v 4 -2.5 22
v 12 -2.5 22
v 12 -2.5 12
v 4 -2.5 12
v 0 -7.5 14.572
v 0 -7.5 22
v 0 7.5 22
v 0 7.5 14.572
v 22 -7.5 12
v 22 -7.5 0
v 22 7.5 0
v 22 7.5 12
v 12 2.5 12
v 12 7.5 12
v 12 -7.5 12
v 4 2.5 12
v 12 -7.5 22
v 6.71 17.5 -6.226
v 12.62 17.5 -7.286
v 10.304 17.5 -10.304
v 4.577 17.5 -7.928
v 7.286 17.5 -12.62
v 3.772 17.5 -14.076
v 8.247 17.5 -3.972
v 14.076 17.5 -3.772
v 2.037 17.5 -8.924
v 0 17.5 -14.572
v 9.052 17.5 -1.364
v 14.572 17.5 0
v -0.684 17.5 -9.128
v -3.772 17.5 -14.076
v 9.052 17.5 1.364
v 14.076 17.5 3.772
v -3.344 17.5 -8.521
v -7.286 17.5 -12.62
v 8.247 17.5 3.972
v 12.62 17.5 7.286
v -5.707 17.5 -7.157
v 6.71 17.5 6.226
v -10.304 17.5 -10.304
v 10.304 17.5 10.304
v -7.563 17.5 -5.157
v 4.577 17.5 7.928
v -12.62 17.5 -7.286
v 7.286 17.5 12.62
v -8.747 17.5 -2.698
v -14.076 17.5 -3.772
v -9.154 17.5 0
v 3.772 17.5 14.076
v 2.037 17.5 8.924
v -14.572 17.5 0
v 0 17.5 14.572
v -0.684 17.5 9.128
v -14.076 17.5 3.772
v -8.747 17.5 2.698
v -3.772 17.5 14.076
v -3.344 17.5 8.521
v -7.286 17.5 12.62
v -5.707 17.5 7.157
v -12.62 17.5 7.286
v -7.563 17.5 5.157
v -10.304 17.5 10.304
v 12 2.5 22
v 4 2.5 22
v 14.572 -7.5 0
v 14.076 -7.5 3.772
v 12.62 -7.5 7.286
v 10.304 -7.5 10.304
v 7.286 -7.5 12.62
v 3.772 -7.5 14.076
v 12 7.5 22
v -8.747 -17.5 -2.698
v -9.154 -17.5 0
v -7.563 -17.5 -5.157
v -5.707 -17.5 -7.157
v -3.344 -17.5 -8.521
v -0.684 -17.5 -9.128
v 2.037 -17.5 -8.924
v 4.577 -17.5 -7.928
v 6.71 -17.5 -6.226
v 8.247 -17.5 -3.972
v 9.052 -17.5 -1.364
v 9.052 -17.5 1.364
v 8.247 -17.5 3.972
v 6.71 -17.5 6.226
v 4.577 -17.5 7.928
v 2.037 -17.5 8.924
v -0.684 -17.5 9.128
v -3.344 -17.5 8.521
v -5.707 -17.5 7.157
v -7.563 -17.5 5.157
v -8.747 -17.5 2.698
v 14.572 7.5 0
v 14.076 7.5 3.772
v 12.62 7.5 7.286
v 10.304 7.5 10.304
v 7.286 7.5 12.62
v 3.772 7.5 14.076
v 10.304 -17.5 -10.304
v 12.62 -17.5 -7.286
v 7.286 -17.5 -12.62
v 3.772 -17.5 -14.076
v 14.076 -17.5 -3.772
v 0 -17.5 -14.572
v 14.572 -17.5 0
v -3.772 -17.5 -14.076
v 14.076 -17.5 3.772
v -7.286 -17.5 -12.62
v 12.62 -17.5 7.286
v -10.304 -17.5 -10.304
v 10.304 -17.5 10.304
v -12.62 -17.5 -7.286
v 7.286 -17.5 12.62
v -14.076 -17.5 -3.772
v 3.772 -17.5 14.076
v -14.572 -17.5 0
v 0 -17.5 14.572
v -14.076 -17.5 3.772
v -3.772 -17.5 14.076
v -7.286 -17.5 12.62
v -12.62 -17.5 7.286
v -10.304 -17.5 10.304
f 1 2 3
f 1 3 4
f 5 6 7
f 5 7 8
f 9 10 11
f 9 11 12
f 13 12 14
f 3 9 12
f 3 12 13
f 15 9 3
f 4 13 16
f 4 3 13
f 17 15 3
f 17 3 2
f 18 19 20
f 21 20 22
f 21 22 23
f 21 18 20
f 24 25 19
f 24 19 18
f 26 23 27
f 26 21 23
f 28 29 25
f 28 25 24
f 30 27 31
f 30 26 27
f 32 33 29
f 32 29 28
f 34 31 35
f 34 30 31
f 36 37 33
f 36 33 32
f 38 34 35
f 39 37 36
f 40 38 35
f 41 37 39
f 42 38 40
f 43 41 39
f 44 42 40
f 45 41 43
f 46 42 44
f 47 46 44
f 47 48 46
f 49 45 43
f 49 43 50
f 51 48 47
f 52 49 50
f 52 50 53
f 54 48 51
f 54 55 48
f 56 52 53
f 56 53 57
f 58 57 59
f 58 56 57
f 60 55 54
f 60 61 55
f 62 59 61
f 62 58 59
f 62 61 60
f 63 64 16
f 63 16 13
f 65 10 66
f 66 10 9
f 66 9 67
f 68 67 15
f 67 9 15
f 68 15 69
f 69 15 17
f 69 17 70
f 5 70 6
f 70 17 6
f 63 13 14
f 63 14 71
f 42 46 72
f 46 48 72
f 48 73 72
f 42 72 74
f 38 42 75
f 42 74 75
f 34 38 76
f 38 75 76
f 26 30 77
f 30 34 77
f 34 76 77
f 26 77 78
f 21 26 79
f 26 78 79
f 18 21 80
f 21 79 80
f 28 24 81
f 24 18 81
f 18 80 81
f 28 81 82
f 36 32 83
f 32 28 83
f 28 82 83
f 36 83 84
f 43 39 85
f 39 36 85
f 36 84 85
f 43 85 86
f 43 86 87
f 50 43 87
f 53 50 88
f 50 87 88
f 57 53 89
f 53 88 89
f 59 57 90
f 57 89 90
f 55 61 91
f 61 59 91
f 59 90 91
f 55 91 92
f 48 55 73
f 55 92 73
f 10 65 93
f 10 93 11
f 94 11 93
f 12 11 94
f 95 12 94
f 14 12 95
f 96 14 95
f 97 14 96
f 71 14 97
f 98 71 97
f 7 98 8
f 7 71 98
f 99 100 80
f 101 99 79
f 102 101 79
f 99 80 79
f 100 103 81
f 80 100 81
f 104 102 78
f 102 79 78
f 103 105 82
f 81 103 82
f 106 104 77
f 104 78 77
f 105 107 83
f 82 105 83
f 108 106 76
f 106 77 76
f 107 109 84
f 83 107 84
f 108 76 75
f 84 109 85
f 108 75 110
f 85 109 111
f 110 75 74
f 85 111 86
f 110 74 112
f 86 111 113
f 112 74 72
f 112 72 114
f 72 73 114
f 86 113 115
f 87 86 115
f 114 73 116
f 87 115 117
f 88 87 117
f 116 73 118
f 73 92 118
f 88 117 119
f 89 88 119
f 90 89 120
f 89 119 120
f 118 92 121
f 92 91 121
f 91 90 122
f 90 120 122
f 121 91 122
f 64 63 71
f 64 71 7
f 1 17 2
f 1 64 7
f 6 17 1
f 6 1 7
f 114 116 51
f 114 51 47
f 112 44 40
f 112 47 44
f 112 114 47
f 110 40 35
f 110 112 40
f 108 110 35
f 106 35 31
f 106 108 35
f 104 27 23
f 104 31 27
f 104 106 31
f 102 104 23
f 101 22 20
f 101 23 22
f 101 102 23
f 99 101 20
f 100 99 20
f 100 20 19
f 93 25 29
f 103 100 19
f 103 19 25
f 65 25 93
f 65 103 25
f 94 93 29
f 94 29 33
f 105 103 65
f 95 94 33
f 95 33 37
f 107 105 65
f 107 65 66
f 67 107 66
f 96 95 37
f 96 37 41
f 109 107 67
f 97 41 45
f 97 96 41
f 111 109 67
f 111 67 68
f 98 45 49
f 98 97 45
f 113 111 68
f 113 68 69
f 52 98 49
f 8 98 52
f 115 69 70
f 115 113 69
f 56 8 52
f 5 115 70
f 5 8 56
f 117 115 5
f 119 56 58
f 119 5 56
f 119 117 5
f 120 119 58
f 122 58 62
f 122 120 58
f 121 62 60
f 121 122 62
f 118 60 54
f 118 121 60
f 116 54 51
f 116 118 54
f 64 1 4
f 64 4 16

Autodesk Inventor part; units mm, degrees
ref_plane "YZ Plane" through (0, 0, 0) normal (1, 0, 0) x (0, 1, 0)
ref_plane "XZ Plane" through (0, 0, 0) normal (0, 1, 0) x (-1, 0, 0)
ref_plane "XY Plane" through (0, 0, 0) normal (0, 0, 1) x (1, 0, 0)
sketch "Boceto1" plane through (0, 0, 0) normal (0, 1, 0) x (-1, 0, 0)
  circle A0 centre (0, 0) radius 9.154
  circle A1 centre (0, 0) radius 14.5725
extrude "Extrusión1" add sketch "Boceto1" along normal mid plane 35
sketch "Boceto2" plane through (0, 0, 0) normal (0, 1, 0) x (-1, 0, 0)
  line L0 (-12, 0) -> (-22, 0)
  line L1 (-22, 0) -> (-22, 12)
  line L2 (-22, 12) -> (-12, 12)
  line L3 (-12, 12) -> (-12, 22)
  line L4 (-12, 22) -> (0, 22)
  line L5 (0, 22) -> (0, 12)
  arc A0 (0, 12) -> (-12, 0) centre (0, 0) ccw
  line L6 (0, 0) -> (0, 23.3606) construction
  line L7 (0, 0) -> (-38.6088, 0) construction
  point P0 (0, 17)
  dimension "d4" = 10
  dimension "d5" = 12
  dimension "d6" = 10
  dimension "d7" = 12
  dimension "d10" = 10
  dimension "d11" = 10
extrude "Extrusión2" add sketch "Boceto2" along normal mid plane 15
sketch "Boceto3" plane through (0, 7.5, 22) normal (0, 0, 1) x (1, 0, 0)
  line L0 (4, -5) -> (12, -5)
  line L1 (12, -5) -> (12, -10)
  line L2 (12, -10) -> (4, -10)
  line L3 (4, -10) -> (4, -5)
  line L4 (12, -15) -> (12, 0) projected
  line L5 (12, -15) -> (0, -15) projected
  point P0 (0, -7.5)
  dimension "d8" = 5
  dimension "d9" = 5
  dimension "d14" = 8
extrude "Extrusión3" cut sketch "Boceto3" against normal blind 10
sketch "Boceto5" plane through (12, 7.5, 12) normal (0, 0, 1) x (1, 0, 0)
  point P0 (-12, -7.5)
properties part number "Sujetador"
